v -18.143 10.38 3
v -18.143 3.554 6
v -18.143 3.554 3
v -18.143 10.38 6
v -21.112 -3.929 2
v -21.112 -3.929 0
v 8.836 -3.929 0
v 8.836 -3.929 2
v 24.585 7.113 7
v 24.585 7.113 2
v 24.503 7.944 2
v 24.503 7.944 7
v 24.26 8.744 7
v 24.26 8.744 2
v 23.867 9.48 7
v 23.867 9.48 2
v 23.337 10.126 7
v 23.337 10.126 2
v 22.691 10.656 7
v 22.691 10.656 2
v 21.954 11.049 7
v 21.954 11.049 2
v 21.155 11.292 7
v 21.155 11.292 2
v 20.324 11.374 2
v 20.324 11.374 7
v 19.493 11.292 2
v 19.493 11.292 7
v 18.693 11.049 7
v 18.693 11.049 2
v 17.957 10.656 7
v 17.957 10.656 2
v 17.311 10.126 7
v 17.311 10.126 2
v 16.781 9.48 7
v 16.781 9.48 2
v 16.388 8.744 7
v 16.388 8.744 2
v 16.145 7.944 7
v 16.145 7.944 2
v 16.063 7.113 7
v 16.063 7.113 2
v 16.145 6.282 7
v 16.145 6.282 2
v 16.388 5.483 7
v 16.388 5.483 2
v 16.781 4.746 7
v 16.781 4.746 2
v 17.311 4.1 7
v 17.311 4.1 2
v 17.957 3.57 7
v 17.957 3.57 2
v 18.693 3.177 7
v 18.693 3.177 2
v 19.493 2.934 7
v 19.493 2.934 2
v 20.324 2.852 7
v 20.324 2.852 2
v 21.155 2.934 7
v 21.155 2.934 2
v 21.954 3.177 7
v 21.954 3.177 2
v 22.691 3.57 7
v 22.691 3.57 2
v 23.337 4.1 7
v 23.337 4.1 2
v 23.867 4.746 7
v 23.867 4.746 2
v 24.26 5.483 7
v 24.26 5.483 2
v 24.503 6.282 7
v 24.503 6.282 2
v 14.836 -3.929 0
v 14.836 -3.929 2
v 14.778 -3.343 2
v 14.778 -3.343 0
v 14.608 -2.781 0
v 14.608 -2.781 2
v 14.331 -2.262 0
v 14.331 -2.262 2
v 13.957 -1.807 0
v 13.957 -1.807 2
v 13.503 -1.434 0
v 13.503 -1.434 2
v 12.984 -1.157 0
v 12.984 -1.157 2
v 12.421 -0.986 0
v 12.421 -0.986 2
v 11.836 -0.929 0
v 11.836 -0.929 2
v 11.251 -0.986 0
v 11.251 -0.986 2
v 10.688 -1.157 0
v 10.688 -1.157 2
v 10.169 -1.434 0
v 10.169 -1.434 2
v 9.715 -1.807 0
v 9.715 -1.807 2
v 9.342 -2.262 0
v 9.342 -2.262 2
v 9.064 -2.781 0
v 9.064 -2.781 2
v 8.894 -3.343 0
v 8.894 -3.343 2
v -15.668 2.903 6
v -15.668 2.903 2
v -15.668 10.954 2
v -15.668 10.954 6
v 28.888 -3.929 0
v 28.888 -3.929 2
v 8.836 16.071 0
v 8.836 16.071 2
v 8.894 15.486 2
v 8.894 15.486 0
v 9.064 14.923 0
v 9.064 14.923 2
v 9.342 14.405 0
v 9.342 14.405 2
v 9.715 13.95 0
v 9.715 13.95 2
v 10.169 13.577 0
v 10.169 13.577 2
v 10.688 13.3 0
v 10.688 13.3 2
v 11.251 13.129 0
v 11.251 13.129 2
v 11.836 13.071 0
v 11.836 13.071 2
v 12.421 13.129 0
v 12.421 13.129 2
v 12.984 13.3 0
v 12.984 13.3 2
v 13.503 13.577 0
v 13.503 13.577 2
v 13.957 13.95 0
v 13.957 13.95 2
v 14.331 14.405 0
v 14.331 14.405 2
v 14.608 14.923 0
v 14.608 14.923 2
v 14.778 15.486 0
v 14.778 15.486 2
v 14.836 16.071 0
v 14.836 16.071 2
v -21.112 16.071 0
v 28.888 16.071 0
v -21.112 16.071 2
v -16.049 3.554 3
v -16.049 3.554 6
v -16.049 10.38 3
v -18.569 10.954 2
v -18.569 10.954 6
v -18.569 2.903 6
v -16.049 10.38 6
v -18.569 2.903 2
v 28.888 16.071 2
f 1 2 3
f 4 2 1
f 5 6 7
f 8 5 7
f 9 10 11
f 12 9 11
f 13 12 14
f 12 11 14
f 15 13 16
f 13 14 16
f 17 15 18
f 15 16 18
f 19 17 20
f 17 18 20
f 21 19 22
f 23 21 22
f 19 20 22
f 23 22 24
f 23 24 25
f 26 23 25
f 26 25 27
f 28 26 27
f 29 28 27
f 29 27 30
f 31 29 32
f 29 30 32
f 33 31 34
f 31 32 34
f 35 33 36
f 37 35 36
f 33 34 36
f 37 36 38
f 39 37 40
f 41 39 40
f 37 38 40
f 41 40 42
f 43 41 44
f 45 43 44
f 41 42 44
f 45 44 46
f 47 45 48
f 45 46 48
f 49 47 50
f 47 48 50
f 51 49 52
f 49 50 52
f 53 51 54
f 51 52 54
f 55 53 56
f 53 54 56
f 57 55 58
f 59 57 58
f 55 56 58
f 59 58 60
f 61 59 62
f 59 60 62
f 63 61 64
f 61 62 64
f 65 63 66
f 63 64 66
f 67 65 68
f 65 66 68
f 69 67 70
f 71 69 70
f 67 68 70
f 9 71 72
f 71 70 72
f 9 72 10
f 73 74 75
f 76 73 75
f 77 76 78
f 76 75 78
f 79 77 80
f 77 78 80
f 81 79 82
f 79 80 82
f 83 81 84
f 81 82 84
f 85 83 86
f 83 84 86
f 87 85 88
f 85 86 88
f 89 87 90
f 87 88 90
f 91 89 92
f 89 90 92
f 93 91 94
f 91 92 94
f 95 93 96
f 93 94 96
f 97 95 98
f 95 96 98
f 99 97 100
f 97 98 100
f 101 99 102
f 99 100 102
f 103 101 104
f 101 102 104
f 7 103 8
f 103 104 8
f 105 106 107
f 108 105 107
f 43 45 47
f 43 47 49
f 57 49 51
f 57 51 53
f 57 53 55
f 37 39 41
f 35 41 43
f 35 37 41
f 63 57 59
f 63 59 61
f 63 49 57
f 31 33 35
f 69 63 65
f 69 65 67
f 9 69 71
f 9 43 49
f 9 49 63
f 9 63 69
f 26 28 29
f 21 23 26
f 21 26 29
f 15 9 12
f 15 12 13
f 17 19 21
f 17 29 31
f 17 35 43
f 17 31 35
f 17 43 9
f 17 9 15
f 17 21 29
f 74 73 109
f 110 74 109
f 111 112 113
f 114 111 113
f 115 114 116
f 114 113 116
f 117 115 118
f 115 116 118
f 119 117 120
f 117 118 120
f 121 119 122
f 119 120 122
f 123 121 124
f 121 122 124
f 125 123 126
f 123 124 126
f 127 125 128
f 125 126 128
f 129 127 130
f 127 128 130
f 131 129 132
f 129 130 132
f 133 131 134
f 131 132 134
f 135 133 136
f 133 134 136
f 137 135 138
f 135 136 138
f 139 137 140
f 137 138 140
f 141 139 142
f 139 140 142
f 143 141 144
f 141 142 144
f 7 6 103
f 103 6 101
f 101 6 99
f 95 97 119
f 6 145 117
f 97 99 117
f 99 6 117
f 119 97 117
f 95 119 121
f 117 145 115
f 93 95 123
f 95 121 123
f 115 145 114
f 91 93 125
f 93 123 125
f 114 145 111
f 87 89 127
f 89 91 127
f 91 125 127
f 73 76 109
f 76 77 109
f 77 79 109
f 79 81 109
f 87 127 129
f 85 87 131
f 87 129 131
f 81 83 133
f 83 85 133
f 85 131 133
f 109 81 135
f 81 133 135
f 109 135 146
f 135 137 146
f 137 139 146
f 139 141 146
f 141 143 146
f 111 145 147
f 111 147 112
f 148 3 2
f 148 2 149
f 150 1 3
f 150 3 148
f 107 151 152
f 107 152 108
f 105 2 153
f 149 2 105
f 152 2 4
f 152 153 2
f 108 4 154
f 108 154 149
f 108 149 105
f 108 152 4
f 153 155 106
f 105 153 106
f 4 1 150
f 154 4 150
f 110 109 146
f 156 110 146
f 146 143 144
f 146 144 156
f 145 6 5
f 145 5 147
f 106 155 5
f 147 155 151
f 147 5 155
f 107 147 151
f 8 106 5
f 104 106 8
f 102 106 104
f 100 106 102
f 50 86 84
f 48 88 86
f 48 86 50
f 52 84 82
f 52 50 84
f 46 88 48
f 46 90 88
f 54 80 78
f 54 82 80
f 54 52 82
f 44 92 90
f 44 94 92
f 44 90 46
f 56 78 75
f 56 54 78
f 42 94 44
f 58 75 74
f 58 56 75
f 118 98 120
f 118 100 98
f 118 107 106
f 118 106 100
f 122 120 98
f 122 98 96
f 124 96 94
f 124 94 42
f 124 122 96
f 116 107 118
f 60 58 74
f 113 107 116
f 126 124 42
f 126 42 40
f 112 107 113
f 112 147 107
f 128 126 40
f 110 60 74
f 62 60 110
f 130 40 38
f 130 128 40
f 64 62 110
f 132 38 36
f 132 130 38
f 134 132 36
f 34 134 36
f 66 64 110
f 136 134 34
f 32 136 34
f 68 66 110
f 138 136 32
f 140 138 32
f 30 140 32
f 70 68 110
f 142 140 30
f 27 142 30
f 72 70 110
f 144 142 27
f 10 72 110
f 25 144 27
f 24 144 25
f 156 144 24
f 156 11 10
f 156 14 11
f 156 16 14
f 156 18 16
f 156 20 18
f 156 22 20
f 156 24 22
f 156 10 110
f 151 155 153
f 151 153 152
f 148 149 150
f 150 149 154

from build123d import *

# Parameters (mm, degrees)
ESQUISSE1_W             = 50
ESQUISSE1_H             = 20
BOSS_EXTRU_1_DEPTH      = 2
ESQUISSE2_R             = 4.260694663
BOSS_EXTRU_2_DEPTH      = 5
ESQUISSE3_R             = 3
ENL_V_MAT_EXTRU_1_DEPTH = 8
ESQUISSE4_W             = 2.90032215
ESQUISSE4_H             = 8.050990352
BOSS_EXTRU_3_DEPTH      = 4
ESQUISSE5_W             = 2.093863404
ESQUISSE5_H             = 6.825994699
ENL_V_MAT_EXTRU_2_DEPTH = 3


with BuildPart() as part:
    # Esquisse1 → Boss.-Extru.1 (new body)
    with BuildSketch(Plane.XY):
        with Locations((3.888470464, 6.071428571)):
            Rectangle(ESQUISSE1_W, ESQUISSE1_H)
    extrude(amount=BOSS_EXTRU_1_DEPTH)

    # Esquisse2 → Boss.-Extru.2 (add)
    with BuildSketch(Plane.XY.offset(2)):
        with Locations((20.32390926, 7.113111312)):
            Circle(ESQUISSE2_R)
    extrude(amount=BOSS_EXTRU_2_DEPTH)

    # Esquisse3 → Enlèv. mat.-Extru.1 (cut)
    with BuildSketch(Plane.XY.offset(2)):
        with Locations((11.836123966, 16.071428571)):
            Circle(ESQUISSE3_R)
        with Locations((11.836123966, -3.928571429)):
            Circle(ESQUISSE3_R)
    extrude(amount=-ENL_V_MAT_EXTRU_1_DEPTH, mode=Mode.SUBTRACT)

    # Esquisse4 → Boss.-Extru.3 (add)
    with BuildSketch(Plane.XY.offset(2)):
        with Locations((-17.118363615, 6.928845047)):
            Rectangle(ESQUISSE4_W, ESQUISSE4_H)
    extrude(amount=BOSS_EXTRU_3_DEPTH)

    # Esquisse5 → Enlèv. mat.-Extru.2 (cut)
    with BuildSketch(Plane.XY.offset(6)):
        with Locations((-17.095752138, 6.967080934)):
            Rectangle(ESQUISSE5_W, ESQUISSE5_H)
    extrude(amount=-ENL_V_MAT_EXTRU_2_DEPTH, mode=Mode.SUBTRACT)


solid = part.part
